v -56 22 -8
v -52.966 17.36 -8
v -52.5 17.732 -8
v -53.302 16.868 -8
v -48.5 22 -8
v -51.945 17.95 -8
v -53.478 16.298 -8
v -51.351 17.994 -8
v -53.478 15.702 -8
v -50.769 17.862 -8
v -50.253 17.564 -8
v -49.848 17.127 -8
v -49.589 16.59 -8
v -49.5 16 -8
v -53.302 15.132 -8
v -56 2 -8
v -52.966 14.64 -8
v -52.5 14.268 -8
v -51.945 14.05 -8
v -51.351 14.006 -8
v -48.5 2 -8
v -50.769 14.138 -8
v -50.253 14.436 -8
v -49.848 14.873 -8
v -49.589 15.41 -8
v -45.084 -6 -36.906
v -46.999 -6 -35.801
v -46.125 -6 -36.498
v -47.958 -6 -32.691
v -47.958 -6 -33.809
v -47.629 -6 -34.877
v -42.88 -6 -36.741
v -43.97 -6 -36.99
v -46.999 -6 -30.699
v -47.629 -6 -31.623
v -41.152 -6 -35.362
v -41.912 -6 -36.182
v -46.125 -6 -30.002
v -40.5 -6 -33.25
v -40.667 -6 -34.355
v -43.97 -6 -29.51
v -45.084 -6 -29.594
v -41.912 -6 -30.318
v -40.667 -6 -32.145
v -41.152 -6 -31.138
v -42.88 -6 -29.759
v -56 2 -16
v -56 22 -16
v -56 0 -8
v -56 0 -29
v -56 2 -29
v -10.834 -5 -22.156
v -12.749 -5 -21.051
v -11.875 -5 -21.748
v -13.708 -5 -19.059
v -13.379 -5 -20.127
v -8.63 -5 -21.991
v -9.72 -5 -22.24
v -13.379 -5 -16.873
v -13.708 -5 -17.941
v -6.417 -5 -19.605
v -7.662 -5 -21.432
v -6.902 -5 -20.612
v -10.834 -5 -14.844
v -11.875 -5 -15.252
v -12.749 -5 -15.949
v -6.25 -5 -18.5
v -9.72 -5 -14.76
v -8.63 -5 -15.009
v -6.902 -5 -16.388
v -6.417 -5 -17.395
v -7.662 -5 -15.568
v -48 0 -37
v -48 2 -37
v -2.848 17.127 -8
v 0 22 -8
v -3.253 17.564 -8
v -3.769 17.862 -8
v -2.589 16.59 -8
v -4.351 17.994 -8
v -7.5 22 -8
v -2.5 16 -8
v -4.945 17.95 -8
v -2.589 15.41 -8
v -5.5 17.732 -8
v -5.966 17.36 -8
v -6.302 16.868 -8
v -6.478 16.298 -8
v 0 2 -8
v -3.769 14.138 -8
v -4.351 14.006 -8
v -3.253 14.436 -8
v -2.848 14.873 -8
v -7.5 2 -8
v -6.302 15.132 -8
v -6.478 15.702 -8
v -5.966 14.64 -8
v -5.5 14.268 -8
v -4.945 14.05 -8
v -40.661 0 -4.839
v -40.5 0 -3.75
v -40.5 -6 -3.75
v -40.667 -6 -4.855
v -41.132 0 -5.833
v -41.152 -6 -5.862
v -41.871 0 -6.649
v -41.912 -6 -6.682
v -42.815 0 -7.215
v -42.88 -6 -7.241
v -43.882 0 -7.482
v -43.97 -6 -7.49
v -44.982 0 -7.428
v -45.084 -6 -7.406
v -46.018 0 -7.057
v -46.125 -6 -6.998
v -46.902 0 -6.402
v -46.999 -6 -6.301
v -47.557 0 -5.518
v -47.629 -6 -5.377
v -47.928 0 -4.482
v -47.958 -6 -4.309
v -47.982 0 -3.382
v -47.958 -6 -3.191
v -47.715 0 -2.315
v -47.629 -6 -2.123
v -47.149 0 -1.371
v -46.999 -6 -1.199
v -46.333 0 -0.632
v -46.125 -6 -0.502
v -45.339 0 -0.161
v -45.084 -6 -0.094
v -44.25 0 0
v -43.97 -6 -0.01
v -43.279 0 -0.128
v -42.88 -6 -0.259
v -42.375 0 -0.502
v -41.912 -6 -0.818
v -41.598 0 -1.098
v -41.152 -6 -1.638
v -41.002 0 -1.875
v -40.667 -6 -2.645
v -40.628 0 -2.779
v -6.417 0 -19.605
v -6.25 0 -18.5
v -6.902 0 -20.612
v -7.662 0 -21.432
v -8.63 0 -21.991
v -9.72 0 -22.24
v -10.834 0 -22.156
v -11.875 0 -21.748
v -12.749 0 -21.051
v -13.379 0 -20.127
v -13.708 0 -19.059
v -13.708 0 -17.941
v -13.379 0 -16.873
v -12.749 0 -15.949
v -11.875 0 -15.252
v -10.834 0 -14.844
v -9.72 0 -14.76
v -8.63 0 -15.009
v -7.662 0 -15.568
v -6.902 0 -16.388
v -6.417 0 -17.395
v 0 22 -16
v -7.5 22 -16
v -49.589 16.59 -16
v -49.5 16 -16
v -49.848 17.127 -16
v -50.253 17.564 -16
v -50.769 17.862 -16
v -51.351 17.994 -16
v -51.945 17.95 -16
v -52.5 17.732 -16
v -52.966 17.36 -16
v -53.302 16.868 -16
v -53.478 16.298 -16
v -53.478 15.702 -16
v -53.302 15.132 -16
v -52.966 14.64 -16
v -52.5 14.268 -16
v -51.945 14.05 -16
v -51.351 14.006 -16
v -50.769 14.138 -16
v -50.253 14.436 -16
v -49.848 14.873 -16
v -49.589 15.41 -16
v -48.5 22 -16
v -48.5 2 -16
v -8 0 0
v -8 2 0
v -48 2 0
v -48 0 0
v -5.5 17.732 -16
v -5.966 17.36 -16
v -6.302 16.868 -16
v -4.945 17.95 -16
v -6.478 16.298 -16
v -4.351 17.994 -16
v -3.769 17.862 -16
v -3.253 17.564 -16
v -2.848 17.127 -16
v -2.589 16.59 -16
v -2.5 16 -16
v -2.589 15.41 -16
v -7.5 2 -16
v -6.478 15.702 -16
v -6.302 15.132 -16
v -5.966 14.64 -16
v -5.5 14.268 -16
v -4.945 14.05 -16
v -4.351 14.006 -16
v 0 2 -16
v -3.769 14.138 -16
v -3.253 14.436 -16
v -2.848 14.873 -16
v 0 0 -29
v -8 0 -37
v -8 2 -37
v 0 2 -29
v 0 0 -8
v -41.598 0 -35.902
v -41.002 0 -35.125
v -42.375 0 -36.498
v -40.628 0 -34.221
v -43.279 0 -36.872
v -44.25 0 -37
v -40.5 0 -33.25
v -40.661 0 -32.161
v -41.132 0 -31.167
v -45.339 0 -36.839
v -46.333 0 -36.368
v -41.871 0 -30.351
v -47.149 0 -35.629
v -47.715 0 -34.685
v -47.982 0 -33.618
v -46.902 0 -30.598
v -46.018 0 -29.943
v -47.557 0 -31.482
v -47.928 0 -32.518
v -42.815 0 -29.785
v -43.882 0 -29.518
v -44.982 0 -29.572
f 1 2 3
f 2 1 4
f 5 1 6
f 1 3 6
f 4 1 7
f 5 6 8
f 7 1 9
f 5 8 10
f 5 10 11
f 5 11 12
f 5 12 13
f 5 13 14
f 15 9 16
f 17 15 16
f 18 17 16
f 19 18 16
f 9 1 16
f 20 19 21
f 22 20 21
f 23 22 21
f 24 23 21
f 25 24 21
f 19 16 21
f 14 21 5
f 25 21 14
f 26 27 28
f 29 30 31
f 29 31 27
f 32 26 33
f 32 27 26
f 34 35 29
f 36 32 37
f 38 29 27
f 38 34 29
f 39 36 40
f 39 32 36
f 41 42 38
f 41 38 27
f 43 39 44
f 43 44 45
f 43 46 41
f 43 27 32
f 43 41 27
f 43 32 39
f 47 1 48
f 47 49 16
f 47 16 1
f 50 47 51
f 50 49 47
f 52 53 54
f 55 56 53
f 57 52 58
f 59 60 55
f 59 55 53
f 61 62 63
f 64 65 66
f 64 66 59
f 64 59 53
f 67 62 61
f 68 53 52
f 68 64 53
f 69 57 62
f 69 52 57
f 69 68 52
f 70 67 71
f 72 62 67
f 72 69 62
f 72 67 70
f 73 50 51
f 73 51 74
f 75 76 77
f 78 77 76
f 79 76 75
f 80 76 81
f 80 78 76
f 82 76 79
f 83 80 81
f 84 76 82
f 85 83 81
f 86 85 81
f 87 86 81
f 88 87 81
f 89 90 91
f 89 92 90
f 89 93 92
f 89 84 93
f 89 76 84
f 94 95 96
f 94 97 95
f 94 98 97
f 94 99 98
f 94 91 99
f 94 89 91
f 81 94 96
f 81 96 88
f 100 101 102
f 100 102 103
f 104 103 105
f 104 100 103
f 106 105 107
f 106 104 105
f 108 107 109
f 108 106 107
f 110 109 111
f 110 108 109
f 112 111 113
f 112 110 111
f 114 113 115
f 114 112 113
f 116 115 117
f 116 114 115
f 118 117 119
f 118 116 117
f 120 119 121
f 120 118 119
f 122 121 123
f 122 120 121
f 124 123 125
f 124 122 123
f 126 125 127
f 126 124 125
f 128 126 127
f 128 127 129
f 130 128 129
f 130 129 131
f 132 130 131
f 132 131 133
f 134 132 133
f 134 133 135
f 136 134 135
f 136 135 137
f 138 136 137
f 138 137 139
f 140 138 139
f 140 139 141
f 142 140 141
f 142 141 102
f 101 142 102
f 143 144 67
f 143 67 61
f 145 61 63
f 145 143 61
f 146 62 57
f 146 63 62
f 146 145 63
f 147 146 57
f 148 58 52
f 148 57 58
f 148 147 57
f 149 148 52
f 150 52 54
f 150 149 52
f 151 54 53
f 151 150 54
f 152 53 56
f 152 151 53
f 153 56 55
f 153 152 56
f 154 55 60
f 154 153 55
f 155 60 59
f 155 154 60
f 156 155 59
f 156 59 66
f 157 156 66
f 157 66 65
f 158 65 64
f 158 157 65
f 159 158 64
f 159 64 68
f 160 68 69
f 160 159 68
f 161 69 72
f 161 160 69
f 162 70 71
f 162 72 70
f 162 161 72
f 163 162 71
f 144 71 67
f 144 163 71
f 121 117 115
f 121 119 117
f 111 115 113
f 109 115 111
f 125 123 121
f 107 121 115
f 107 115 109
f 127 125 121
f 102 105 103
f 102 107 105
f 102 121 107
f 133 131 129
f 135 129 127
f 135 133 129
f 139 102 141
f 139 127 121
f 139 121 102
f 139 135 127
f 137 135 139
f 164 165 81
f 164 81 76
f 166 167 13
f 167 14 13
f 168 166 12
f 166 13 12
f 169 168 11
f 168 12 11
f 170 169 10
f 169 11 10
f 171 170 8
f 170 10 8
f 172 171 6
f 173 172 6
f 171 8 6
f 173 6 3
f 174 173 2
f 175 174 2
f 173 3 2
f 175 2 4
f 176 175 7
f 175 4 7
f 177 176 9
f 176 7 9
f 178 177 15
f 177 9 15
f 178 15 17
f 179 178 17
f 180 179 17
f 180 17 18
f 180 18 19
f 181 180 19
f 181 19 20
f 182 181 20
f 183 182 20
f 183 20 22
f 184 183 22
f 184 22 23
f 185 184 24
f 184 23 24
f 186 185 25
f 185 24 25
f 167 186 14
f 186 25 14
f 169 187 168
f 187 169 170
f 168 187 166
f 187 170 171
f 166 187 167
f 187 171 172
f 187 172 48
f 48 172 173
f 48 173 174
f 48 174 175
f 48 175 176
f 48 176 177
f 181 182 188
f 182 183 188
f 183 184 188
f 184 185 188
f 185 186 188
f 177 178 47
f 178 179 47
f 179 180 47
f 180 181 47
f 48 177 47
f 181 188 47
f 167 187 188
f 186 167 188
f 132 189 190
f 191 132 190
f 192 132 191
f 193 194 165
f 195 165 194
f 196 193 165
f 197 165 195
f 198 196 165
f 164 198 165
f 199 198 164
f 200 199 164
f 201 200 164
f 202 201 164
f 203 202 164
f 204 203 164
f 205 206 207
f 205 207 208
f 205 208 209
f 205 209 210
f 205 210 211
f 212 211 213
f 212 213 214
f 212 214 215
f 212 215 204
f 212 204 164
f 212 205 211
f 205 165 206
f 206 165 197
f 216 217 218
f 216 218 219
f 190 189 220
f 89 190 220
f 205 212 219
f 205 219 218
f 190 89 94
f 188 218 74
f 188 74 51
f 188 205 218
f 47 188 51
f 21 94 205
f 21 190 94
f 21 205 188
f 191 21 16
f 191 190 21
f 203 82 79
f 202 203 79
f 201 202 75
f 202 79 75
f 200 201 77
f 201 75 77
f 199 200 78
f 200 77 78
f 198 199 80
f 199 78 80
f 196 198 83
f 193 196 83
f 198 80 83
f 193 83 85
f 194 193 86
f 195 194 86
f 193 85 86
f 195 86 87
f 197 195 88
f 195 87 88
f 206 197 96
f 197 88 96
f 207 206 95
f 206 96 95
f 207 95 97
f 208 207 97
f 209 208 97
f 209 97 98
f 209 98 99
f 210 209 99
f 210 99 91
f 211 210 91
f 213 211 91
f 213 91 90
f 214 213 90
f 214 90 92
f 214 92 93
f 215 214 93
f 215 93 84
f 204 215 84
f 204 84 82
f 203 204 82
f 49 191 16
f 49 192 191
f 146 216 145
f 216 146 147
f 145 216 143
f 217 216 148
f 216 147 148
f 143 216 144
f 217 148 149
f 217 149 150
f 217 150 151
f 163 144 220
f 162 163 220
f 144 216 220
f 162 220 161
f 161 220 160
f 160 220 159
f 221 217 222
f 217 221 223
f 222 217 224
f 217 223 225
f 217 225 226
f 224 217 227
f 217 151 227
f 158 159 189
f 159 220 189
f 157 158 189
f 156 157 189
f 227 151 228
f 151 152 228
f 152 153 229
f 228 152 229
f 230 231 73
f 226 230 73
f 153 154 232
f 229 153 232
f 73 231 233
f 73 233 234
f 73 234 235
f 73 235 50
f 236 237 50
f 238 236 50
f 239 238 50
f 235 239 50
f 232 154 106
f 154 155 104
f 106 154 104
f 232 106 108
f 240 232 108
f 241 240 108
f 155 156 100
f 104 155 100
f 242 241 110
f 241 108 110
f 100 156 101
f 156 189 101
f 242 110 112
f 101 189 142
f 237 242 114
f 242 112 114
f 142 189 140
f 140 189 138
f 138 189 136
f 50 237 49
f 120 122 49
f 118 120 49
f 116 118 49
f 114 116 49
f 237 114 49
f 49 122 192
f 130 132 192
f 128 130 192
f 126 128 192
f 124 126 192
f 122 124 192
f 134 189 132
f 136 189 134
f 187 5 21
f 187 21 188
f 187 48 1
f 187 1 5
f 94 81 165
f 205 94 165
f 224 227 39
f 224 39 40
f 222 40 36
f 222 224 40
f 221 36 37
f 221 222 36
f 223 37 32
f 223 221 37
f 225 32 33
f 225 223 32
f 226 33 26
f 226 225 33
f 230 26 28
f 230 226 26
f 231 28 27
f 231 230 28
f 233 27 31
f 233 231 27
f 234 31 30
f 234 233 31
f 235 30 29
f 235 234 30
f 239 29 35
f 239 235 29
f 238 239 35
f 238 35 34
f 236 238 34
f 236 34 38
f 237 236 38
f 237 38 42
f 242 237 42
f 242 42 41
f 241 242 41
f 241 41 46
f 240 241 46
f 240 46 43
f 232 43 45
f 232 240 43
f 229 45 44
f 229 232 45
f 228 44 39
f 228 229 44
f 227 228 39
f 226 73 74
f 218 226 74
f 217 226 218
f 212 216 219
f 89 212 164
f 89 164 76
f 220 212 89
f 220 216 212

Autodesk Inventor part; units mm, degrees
ref_plane "YZ Plane" through (0, 0, 0) normal (1, 0, 0) x (0, 1, 0)
ref_plane "XZ Plane" through (0, 0, 0) normal (0, 1, 0) x (-1, 0, 0)
ref_plane "XY Plane" through (0, 0, 0) normal (0, 0, 1) x (1, 0, 0)
sketch "Sketch1" plane through (0, 0, 0) normal (0, 1, 0) x (-1, 0, 0)
  line L0 (56, 0) -> (0, 0) construction
  line L1 (0, 0) -> (0, -37) construction
  line L2 (0, -37) -> (56, -37) construction
  line L3 (56, -37) -> (56, 0) construction
  line L4 (56, 0) -> (48, 0) construction
  line L5 (48, 0) -> (48, -8) construction
  line L6 (48, -8) -> (56, -8) construction
  line L7 (56, -8) -> (56, 0) construction
  line L8 (56, -37) -> (48, -37) construction
  line L9 (48, -37) -> (48, -29) construction
  line L10 (48, -29) -> (56, -29) construction
  line L11 (56, -29) -> (56, -37) construction
  line L12 (0, 0) -> (8, 0) construction
  line L13 (8, 0) -> (8, -8) construction
  line L14 (8, -8) -> (0, -8) construction
  line L15 (0, -8) -> (0, 0) construction
  line L16 (0, -37) -> (8, -37) construction
  line L17 (8, -37) -> (8, -29) construction
  line L18 (8, -29) -> (0, -29) construction
  line L19 (0, -29) -> (0, -37) construction
  line L20 (48, 0) -> (56, -8)
  line L21 (56, -29) -> (48, -37)
  line L22 (8, -37) -> (0, -29)
  line L23 (8, 0) -> (0, -8)
  line L24 (56, -8) -> (56, -29)
  line L25 (48, -37) -> (8, -37)
  line L26 (0, -29) -> (0, -8)
  line L27 (8, 0) -> (48, 0)
  dimension "d0" = 56
  dimension "d1" = 37
  dimension "d2" = 8
  dimension "d3" = 8
  dimension "d4" = 8
  dimension "d5" = 8
  dimension "d6" = 8
  dimension "d7" = 8
  dimension "d8" = 8
  dimension "d9" = 8
extrude "Extrusion1" add sketch "Sketch1" along normal blind 2
sketch "Sketch2" plane through (0, 2, 0) normal (0, 1, 0) x (1, 0, 0)
  line L0 (-56, 29) -> (-56, 8) projected
  line L1 (-56, 8) -> (-48.5, 8)
  line L2 (-48.5, 8) -> (-48.5, 16)
  line L3 (-48.5, 16) -> (-56, 16)
  line L4 (-56, 16) -> (-56, 8)
  line L5 (-8, 0) -> (0, 8) projected
  line L6 (0, 8) -> (-7.5, 8)
  line L7 (-7.5, 8) -> (-7.5, 16)
  line L8 (-7.5, 16) -> (0, 16)
  line L9 (0, 16) -> (0, 8)
  point P0 (0, 0)
  dimension "d12" = 8
  dimension "d13" = 7.5
  dimension "d14" = 8
  dimension "d15" = 7.5
extrude "Extrusion2" add sketch "Sketch2" along normal blind 20
sketch "Sketch3" plane through (-56, 2, -8) normal (0, 0, 1) x (1, 0, 0)
  circle A0 centre (4.5, 14) radius 2
  line L0 (8, 0) -> (48, 0) projected
  line L1 (7.5, 0) -> (7.5, 20) projected
  circle A1 centre (51.5, 14) radius 2
  line L2 (48.5, 0) -> (48.5, 20) projected
  point P0 (56, -2)
  dimension "d18" = 14
  dimension "d19" = 3
  dimension "d20" = 4
  dimension "d21" = 14
  dimension "d22" = 3
  dimension "d23" = 4
extrude "Extrusion3" cut sketch "Sketch3" against normal through all
sketch "Sketch4" plane through (0, 0, 0) normal (0, -1, 0) x (1, 0, 0)
  circle A0 centre (-10, -18.5) radius 3.75
  line L0 (0, -8) -> (0, -29) projected
  line L1 (-48, 0) -> (-8, 0) projected
  circle A1 centre (-44.25, -3.75) radius 3.75
  circle A2 centre (-44.25, -33.25) radius 3.75
  line L2 (-56, -29) -> (-56, -8) projected
  point P0 (0, 0)
  dimension "d26" = 7.5
  dimension "d27" = 10
  dimension "d28" = 18.5
  dimension "d29" = 7.5
  dimension "d30" = 7.5
  dimension "d31" = 29.5
  dimension "d32" = 3.75
  dimension "d33" = 11.75
  dimension "d34" = 11.75
extrude "Extrusion4" add sketch "Sketch4" along normal blind 6 contours A1 | A2
extrude "Extrusion5" add sketch "Sketch4" along normal blind 5 contours A0
properties part number "RCT-P002_servo_plate_mount"
